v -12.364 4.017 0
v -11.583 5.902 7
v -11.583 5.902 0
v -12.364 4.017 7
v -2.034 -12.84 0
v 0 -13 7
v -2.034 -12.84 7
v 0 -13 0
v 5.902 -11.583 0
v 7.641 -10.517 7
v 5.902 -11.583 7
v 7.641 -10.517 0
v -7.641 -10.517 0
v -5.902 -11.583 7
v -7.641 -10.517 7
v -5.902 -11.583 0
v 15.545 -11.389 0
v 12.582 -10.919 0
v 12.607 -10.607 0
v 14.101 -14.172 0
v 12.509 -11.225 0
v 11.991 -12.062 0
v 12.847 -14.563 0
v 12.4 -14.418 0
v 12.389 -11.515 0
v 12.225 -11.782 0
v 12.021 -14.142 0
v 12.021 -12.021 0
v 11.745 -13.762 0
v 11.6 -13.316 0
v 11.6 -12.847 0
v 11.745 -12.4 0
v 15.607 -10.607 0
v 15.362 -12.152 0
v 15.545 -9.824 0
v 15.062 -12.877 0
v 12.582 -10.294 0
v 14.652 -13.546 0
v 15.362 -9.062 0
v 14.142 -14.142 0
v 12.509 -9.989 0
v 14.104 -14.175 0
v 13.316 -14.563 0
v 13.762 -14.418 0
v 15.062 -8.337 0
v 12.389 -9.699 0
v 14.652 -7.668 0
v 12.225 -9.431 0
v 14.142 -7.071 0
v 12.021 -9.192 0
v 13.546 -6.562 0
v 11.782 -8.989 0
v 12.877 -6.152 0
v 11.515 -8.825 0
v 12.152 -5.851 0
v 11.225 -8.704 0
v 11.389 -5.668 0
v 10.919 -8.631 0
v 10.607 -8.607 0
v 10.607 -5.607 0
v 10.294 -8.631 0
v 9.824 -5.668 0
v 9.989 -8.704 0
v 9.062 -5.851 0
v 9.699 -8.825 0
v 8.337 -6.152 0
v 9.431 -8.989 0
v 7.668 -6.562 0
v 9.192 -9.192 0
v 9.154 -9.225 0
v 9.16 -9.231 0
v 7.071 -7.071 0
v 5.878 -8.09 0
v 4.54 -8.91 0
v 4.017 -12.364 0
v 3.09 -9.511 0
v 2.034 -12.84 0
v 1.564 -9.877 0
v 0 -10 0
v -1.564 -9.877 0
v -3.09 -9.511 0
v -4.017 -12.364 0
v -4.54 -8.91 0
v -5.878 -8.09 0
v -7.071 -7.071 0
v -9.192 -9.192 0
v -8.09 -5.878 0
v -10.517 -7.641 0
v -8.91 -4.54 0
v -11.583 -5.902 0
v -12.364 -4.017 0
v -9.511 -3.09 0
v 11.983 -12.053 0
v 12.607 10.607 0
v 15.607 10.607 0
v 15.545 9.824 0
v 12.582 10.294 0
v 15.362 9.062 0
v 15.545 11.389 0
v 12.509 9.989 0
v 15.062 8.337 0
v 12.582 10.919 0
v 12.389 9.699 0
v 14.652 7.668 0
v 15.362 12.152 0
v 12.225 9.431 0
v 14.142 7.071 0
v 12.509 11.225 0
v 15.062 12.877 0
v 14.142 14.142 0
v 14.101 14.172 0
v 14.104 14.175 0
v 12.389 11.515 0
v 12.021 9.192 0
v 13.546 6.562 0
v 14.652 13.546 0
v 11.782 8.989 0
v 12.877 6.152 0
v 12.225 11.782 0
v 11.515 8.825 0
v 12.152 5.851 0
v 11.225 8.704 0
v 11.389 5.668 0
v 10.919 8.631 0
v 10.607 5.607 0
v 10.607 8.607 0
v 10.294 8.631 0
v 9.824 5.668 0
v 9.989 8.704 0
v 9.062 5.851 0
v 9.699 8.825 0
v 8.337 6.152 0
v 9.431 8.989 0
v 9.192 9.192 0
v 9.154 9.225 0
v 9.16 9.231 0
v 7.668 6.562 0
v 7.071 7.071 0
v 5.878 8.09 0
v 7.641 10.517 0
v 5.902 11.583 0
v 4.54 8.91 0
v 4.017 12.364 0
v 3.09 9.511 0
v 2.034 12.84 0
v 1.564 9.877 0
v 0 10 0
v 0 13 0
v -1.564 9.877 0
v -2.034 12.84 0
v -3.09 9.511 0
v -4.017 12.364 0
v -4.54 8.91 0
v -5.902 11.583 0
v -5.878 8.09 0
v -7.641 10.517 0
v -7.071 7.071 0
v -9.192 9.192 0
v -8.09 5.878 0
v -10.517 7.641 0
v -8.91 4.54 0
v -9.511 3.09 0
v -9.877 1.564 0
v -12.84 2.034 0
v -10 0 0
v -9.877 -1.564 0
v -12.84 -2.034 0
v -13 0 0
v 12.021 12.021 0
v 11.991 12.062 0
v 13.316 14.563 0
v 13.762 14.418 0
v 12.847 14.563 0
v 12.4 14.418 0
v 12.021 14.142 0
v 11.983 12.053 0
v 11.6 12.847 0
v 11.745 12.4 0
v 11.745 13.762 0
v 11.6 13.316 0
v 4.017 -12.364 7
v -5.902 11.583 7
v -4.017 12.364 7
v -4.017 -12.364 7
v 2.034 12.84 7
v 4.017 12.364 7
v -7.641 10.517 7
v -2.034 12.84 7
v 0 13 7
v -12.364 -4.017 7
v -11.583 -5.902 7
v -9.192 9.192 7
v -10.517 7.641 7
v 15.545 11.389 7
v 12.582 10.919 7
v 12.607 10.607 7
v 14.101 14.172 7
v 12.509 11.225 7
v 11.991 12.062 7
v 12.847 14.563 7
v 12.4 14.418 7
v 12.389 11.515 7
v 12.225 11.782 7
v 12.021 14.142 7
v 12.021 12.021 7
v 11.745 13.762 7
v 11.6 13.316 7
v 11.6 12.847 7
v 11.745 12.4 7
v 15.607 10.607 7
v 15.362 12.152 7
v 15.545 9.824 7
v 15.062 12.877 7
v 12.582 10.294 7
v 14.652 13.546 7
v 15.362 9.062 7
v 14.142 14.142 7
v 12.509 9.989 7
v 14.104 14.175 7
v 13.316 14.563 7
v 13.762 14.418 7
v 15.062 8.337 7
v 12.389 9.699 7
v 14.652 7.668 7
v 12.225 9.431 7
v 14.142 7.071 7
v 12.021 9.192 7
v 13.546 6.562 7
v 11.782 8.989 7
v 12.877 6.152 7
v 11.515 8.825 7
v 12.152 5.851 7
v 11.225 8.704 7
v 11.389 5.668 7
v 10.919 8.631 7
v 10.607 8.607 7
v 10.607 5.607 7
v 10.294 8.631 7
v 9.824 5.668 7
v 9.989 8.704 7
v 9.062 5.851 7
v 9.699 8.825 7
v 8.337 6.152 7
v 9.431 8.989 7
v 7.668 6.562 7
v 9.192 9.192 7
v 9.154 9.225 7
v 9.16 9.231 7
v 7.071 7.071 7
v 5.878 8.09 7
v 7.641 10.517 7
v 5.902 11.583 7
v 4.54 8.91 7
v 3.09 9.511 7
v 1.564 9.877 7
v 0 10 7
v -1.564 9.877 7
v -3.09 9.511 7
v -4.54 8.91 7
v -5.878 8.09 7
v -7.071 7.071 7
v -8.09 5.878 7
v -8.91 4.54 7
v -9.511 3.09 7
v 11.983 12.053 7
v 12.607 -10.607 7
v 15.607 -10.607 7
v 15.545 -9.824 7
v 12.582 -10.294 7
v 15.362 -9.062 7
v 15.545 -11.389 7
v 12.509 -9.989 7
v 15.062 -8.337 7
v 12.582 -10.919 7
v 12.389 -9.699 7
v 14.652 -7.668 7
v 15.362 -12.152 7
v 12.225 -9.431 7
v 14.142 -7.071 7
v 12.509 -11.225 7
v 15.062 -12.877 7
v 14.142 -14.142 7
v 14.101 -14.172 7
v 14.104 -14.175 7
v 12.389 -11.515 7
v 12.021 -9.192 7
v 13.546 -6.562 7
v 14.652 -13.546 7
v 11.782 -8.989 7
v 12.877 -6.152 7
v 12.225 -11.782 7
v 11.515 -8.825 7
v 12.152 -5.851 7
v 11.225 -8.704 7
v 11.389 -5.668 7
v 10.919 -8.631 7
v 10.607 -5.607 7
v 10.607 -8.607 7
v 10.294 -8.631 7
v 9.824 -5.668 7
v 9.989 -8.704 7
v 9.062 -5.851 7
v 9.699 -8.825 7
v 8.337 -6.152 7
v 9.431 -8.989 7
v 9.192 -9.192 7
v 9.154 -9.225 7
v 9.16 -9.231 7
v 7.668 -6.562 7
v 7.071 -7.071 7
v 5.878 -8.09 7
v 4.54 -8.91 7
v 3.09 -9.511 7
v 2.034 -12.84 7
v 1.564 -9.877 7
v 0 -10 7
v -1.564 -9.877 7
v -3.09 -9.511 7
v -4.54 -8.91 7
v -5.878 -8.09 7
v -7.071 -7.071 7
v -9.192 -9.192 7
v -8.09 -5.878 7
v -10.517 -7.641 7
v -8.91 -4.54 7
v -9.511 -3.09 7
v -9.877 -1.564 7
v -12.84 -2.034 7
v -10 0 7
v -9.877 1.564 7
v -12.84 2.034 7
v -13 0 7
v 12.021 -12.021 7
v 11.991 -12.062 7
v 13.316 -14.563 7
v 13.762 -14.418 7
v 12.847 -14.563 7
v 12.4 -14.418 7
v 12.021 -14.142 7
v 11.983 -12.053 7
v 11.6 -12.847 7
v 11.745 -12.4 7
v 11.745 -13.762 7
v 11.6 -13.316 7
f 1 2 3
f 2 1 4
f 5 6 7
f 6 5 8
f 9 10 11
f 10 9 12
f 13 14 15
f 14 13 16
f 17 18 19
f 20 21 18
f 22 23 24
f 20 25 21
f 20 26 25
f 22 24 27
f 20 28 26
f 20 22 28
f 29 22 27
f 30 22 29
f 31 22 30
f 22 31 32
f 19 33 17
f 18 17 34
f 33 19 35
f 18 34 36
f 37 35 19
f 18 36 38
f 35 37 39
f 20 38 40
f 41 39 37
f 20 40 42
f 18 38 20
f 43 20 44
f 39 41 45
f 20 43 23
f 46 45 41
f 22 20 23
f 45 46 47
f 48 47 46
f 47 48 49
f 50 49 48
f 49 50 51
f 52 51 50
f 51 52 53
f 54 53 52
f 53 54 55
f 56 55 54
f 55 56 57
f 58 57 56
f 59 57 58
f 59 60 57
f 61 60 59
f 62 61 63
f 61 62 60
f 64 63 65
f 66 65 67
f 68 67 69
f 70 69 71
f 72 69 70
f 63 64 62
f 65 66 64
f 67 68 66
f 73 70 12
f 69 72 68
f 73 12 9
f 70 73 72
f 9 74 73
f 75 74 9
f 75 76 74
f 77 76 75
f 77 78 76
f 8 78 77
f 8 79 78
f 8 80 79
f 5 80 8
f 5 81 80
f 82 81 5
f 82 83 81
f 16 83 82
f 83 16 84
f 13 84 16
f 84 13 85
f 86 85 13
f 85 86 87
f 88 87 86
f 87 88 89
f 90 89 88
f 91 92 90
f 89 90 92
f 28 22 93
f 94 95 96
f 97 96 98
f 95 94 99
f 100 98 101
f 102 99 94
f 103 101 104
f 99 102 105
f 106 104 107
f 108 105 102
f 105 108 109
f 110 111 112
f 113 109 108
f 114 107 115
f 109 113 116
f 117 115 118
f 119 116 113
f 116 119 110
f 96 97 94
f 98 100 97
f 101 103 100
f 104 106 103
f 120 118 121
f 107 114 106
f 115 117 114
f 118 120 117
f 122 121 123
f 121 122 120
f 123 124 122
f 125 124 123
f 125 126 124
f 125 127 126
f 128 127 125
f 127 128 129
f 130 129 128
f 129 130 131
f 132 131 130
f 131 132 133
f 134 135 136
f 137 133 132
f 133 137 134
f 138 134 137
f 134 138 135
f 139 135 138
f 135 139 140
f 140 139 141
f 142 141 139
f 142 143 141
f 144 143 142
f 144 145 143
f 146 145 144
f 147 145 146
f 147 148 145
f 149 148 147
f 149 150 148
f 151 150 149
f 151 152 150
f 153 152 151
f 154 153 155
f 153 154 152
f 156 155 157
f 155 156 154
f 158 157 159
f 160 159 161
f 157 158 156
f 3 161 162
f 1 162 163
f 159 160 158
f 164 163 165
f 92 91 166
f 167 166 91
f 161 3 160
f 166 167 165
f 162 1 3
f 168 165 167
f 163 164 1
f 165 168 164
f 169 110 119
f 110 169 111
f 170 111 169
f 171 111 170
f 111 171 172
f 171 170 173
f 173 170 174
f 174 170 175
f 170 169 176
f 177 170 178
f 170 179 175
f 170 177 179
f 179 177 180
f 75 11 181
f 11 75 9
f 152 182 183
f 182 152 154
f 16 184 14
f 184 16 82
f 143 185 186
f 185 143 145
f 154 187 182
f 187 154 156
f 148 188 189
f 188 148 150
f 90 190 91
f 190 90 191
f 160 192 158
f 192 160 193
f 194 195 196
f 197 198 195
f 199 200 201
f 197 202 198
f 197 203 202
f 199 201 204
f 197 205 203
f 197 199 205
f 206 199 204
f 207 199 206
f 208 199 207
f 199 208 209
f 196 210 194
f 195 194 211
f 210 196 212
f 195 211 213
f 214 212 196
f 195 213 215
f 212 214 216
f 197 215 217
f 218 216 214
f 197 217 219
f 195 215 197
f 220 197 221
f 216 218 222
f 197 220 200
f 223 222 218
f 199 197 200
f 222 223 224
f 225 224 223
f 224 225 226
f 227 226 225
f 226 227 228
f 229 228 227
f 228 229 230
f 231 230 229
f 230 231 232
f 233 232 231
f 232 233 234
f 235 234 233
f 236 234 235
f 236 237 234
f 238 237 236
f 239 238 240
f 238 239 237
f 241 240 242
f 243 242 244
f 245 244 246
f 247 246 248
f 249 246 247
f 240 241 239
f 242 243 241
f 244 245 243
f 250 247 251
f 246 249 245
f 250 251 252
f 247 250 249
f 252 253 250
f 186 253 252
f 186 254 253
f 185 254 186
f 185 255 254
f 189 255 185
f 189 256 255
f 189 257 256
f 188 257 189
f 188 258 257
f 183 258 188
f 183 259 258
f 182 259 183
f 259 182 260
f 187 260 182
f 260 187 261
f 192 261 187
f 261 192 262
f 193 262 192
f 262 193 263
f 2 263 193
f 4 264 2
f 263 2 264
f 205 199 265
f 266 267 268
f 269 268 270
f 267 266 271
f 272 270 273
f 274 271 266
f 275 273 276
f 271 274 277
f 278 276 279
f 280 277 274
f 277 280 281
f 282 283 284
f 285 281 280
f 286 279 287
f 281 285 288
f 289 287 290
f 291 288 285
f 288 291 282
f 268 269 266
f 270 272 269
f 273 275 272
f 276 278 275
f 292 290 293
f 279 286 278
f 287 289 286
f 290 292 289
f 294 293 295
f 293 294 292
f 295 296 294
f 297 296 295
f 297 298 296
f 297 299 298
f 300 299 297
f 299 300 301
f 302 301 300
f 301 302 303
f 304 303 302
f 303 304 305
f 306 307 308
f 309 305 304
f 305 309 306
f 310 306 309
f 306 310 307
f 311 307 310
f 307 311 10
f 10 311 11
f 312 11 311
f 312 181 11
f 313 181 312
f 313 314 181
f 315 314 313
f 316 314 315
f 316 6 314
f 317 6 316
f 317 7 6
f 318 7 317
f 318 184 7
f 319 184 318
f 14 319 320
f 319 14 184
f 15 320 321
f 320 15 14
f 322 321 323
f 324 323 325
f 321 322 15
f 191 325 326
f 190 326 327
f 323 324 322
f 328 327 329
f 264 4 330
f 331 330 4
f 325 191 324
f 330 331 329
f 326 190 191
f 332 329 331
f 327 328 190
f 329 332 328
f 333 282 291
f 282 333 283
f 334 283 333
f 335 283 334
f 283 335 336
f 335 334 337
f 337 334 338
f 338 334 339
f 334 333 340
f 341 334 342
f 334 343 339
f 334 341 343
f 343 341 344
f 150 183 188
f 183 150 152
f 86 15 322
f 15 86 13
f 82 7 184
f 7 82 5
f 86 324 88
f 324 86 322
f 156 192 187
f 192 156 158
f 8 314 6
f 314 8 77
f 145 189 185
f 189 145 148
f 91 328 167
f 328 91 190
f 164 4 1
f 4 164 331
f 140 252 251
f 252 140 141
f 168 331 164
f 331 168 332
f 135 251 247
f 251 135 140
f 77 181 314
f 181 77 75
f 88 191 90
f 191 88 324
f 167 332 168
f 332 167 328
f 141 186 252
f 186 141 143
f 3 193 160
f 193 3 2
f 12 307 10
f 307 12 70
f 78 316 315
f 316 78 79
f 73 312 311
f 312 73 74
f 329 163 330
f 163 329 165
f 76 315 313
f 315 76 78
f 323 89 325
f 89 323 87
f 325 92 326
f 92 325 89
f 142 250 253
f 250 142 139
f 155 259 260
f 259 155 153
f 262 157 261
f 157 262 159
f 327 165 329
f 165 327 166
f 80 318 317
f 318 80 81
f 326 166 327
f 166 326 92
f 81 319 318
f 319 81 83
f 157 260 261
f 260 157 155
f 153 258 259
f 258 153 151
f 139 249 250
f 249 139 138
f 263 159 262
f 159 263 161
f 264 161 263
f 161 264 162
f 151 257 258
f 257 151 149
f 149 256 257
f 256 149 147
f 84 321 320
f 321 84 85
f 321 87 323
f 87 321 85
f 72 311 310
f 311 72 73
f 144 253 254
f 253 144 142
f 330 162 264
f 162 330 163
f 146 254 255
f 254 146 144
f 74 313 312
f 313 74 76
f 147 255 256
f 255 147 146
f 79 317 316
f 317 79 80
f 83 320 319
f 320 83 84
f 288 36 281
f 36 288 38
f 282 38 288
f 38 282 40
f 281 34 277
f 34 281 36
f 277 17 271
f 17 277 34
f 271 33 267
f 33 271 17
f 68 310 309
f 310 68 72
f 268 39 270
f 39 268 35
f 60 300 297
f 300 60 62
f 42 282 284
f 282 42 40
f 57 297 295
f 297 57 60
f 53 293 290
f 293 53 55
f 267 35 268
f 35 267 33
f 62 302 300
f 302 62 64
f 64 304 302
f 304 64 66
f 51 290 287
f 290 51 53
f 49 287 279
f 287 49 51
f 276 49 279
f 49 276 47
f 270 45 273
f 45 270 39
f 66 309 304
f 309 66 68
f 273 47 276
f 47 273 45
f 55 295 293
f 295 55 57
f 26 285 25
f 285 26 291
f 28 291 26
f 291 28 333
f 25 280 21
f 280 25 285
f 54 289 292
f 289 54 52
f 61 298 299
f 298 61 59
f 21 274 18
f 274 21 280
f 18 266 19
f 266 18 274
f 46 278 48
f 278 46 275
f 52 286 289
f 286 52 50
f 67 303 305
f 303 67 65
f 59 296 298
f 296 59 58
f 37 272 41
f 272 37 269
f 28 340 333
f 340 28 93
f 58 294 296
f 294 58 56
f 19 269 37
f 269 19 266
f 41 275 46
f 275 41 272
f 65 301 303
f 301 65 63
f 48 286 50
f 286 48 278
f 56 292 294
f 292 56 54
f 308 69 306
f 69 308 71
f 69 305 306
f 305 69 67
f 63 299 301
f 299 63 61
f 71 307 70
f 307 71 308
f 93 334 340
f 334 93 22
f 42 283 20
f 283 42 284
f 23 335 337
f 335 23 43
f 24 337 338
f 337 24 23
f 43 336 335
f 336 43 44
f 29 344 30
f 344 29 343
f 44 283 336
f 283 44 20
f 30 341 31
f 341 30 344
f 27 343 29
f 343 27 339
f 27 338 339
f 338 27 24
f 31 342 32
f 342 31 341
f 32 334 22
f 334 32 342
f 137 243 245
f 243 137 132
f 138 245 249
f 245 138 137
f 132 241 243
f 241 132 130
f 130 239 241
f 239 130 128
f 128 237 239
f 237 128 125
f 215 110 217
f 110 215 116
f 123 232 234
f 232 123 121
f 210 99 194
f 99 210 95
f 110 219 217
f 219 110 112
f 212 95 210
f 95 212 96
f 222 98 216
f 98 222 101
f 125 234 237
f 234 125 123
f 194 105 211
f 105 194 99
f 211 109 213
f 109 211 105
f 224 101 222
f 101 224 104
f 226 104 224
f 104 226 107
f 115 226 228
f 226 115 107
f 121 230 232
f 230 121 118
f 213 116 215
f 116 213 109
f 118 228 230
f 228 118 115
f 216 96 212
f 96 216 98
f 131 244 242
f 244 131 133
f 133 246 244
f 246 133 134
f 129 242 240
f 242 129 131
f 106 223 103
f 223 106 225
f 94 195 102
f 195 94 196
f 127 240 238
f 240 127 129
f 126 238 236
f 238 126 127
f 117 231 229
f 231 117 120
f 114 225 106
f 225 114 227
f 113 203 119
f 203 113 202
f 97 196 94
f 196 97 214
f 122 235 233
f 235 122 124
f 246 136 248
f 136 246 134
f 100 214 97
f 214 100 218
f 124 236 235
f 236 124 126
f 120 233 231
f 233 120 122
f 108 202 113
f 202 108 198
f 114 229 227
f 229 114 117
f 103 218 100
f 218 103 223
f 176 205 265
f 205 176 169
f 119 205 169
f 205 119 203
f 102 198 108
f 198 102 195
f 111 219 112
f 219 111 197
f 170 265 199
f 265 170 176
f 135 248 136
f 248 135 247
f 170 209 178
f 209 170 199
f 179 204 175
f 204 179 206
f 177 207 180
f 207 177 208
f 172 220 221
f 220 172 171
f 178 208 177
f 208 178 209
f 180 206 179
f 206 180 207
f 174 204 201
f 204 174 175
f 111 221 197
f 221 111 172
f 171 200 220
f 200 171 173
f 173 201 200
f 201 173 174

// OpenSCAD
use <MCAD/regular_shapes.scad>

r = 20/2;
t = 3;
h = 7;

rs = 2;

o1 = t/2 + rs;

theta = 180/4;

difference(){
    cylinder_tube(h, r + t, t, $fn=40);
    linear_extrude(height=h){
        polygon([
            [0, 0],
            [2*r * sin(theta), 2*r * cos(theta)],
            [2*r * sin(theta), -2*r * cos(theta)]
        ]);
    }
}

eps = 0.1;

translate([(r + t + rs) * sin(theta), -(r + t + rs) * cos(theta), 0]){
    rotate([0, 0, 180 + 90 + theta]){
        intersection(){
            cylinder_tube(h, rs + t, t, $fn=40);
            translate([0, (rs + t)/2, h/2])
            cube([2 * rs + 2 * t, rs + t + eps, h], center=true);
        }
        translate([rs + t/2, 0, 0])
        cylinder(h, t/2, t/2, $fn=20);
    }
}

translate([(r + t + rs) * sin(theta), (r + t + rs) * cos(theta), 0]){
    rotate([0, 0, 180 + 90 - theta]){
        intersection(){
            cylinder_tube(h, rs + t, t, $fn=40);
            translate([0, (rs + t)/2, h/2])
            cube([2 * rs + 2 * t, rs + t + eps, h], center=true);
        }
        translate([-rs - t/2, 0, 0])
        cylinder(h, t/2, t/2, $fn=20);
    }
}
